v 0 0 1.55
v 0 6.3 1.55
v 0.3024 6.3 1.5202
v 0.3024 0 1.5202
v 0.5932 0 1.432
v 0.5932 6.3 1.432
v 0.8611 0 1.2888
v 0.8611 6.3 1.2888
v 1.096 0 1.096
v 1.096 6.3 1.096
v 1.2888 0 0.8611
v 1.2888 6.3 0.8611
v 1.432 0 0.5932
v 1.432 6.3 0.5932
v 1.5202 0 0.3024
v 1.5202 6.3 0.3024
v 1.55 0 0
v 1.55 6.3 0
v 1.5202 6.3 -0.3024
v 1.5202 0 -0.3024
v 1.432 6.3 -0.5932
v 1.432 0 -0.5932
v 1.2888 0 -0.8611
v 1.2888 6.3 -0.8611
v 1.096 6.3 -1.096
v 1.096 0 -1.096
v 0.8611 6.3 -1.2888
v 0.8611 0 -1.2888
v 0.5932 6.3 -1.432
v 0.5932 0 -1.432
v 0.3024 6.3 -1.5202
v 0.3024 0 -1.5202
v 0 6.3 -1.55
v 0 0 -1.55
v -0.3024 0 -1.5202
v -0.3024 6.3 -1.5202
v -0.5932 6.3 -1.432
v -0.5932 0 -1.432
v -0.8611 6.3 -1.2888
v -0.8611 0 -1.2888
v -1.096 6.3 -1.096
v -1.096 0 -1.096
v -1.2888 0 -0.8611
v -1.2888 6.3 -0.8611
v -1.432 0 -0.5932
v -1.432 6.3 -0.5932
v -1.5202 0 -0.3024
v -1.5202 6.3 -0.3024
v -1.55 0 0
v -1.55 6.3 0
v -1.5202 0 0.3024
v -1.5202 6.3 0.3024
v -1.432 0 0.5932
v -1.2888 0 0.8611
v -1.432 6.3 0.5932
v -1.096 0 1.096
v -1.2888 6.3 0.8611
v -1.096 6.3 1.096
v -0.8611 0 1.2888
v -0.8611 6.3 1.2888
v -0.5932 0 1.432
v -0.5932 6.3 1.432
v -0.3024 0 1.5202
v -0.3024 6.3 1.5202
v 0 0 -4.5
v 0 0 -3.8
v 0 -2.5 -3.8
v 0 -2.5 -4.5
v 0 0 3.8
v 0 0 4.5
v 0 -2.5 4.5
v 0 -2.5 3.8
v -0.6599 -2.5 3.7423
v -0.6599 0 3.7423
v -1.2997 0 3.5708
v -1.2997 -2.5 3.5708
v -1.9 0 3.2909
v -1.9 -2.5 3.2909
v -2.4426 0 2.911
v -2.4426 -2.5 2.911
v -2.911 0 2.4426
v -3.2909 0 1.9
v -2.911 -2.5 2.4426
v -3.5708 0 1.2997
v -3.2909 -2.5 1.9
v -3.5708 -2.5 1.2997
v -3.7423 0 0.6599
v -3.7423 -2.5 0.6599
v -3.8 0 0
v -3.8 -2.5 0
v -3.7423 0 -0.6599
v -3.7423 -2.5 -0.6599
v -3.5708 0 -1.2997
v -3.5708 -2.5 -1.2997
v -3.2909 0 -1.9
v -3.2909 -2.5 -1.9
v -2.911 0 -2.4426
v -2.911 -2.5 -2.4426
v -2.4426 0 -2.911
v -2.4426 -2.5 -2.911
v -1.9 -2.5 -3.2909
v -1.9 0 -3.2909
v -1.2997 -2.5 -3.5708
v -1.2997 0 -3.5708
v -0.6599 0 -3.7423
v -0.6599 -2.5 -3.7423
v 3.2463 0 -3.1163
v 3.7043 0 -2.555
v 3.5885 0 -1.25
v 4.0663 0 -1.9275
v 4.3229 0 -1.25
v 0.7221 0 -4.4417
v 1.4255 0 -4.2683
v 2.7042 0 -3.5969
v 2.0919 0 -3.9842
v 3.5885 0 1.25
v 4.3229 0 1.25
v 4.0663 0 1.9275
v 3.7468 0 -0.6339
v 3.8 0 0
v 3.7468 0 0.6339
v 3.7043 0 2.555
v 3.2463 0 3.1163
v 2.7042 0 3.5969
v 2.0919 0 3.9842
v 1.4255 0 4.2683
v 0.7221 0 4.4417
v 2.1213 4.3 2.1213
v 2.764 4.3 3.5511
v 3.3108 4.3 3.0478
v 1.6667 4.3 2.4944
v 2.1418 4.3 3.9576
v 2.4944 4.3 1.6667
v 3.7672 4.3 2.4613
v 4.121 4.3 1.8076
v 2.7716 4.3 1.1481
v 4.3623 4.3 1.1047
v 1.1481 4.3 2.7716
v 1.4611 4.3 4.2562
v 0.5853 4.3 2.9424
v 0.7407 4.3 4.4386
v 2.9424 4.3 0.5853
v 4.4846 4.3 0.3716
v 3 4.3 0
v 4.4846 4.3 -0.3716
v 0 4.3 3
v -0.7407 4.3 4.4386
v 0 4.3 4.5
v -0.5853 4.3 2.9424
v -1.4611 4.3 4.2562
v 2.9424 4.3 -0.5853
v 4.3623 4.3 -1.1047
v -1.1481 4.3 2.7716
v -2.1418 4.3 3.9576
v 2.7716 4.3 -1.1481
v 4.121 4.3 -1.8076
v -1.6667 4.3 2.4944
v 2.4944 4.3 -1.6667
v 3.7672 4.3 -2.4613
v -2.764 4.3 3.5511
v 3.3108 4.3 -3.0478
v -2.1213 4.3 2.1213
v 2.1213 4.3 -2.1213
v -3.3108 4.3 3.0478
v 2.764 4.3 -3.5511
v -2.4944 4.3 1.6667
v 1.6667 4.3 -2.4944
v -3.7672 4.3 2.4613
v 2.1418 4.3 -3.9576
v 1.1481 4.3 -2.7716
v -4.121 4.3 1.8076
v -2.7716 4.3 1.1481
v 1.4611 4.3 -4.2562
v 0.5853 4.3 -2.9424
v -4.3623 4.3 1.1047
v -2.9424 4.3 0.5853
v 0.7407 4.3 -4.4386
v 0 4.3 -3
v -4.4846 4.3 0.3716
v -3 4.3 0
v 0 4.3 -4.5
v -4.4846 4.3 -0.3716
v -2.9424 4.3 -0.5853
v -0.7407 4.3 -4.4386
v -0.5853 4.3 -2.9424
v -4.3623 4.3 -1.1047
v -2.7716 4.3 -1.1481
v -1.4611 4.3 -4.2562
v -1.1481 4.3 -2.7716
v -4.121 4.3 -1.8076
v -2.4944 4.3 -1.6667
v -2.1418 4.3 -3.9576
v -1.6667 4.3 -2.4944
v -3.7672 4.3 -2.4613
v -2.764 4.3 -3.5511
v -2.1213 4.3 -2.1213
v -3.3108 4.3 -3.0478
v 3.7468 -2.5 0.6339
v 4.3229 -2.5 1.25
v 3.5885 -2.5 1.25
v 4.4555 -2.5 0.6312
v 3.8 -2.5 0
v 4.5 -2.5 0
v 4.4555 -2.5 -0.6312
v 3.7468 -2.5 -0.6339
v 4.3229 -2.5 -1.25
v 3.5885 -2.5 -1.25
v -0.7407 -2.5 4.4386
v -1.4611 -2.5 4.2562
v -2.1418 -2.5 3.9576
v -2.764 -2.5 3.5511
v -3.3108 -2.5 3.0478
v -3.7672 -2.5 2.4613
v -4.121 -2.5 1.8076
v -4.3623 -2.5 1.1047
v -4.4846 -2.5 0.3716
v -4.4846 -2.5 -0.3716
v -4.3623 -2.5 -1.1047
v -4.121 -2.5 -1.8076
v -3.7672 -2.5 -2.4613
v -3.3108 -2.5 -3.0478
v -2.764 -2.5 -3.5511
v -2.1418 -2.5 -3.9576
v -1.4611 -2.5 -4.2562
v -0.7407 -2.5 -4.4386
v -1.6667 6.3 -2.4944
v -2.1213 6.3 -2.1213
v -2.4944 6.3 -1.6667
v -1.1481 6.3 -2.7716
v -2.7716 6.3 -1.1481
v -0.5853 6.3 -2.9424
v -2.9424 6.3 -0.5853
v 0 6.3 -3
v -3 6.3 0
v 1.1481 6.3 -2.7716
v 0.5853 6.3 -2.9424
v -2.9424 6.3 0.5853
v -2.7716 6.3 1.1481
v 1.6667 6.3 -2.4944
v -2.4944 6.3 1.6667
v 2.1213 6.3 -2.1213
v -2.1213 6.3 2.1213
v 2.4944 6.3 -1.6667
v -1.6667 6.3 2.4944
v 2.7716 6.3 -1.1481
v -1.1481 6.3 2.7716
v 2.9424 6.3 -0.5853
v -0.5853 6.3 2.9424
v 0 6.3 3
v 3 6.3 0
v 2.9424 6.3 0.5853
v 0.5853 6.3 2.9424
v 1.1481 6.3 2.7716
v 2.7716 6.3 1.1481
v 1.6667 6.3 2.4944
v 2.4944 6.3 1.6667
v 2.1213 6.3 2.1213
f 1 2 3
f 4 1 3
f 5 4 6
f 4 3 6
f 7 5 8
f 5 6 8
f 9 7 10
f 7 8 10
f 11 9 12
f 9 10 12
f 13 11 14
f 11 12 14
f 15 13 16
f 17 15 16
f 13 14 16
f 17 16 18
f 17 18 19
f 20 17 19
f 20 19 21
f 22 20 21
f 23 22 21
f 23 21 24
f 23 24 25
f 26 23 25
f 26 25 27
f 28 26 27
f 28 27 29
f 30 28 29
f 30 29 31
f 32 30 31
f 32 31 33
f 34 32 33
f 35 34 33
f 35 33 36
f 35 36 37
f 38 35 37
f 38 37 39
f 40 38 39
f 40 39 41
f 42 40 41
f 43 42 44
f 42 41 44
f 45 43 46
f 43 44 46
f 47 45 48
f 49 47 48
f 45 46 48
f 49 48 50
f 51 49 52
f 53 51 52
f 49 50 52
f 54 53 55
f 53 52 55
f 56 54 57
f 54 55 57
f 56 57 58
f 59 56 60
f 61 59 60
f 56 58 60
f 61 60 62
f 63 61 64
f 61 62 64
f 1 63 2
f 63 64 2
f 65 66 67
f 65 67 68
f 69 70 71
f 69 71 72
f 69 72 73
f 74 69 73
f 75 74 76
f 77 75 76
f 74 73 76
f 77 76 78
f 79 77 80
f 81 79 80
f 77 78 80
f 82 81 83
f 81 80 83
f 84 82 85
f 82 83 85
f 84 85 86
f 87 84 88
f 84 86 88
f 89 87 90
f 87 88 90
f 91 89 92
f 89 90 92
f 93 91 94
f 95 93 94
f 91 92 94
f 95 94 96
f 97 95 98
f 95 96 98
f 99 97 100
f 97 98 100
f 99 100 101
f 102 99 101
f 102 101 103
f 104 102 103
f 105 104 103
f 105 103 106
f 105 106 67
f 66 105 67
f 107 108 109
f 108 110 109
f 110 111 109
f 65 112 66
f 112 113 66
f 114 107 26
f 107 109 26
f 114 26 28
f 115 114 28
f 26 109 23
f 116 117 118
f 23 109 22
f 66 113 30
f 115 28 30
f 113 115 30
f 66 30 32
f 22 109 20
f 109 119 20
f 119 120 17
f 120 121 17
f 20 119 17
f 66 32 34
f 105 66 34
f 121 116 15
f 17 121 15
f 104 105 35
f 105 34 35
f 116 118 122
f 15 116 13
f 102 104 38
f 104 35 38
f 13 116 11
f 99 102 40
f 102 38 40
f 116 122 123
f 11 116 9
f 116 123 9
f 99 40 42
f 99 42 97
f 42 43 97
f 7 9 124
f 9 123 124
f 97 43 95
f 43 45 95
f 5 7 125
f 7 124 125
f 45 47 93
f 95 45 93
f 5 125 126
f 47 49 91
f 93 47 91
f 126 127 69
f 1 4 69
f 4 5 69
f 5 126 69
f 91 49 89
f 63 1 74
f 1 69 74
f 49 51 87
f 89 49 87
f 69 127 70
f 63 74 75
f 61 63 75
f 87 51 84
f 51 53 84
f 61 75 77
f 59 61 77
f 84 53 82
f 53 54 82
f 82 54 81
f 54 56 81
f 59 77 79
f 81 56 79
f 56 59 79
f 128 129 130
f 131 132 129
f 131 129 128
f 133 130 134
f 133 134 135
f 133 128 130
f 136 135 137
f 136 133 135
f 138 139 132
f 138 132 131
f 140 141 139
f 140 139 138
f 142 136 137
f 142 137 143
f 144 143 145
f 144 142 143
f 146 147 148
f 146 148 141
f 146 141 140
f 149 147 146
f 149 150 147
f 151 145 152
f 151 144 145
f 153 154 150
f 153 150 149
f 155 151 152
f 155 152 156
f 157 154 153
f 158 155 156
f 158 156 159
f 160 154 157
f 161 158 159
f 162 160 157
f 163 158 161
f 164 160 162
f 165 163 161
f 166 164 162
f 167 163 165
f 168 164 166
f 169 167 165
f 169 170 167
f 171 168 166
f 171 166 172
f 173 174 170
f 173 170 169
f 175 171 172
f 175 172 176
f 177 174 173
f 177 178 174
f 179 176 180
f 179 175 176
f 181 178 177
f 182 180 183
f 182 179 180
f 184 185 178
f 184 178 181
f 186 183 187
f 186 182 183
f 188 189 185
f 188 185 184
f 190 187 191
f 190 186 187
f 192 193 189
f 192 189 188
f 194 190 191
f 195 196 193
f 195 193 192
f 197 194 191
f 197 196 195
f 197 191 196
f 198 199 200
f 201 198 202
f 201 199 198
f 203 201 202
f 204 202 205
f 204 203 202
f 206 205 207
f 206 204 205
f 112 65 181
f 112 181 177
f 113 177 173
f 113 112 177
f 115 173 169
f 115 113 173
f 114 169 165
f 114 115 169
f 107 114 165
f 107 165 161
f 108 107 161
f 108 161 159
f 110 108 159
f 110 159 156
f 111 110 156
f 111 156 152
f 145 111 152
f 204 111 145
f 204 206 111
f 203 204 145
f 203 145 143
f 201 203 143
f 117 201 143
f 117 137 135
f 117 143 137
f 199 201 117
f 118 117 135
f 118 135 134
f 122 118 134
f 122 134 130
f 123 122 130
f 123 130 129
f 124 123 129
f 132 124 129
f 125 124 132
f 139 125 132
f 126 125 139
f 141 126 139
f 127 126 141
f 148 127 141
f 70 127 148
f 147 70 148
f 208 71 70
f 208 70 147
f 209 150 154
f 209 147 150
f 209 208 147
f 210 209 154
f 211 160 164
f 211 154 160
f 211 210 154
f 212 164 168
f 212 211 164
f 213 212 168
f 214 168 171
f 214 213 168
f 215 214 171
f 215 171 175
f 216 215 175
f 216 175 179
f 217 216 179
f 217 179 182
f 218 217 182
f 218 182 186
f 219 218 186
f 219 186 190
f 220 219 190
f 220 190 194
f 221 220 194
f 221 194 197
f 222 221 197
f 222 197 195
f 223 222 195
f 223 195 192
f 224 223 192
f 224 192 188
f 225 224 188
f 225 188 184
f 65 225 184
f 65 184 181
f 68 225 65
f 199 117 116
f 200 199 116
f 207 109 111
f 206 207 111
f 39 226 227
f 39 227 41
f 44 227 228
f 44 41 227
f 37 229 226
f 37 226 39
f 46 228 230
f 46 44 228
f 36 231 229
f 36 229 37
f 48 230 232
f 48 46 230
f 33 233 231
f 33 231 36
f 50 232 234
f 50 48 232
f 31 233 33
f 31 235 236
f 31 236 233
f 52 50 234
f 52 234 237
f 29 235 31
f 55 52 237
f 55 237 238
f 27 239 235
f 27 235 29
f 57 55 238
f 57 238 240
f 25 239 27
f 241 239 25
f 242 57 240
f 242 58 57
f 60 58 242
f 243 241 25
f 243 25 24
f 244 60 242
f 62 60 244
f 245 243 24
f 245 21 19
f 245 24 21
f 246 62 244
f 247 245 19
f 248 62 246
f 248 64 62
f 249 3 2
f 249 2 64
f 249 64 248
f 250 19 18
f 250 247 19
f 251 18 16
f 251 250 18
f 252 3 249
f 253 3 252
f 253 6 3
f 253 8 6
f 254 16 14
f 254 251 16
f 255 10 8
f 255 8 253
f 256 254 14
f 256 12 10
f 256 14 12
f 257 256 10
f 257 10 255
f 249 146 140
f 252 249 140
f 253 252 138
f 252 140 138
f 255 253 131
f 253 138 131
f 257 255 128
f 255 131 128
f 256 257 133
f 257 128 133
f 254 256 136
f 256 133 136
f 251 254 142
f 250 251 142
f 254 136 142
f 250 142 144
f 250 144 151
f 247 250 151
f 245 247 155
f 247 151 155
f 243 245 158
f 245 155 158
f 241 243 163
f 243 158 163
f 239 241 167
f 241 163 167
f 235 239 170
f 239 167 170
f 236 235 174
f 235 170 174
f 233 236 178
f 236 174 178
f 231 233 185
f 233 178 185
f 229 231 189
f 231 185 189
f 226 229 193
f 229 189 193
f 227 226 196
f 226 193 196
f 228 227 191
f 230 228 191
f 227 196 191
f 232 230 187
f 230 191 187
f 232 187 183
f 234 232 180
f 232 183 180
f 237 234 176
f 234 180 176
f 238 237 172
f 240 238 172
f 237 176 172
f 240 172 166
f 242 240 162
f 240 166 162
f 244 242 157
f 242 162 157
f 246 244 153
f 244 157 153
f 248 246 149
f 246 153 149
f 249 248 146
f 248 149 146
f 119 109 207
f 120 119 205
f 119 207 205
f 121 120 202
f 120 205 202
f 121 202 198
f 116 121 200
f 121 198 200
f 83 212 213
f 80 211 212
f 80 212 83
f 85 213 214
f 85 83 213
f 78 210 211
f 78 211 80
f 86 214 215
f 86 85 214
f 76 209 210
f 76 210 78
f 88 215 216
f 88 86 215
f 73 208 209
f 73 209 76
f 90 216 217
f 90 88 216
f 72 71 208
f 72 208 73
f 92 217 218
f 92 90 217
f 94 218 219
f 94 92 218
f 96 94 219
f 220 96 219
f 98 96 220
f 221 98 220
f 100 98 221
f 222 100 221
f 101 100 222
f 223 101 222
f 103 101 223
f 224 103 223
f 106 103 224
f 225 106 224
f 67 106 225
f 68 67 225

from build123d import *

# Parameters (mm, degrees)
SKETCH1_R           = 4.5
BOSS_EXTRUDE1_DEPTH = 4.3
SKETCH2_R           = 3
BOSS_EXTRUDE2_DEPTH = 2
SKETCH3_R           = 1.55
CUT_EXTRUDE1_DEPTH  = 9.954886934
BOSS_EXTRUDE3_START = 2.5
SKETCH4_R           = 4.5
SKETCH4_R_2         = 3.8
BOSS_EXTRUDE3_DEPTH = 2.5
CUT_EXTRUDE2_DEPTH  = 9.954886934


with BuildPart() as part:
    # Sketch1 → Boss-Extrude1 (new body)
    with BuildSketch(Plane(origin=(0, 0, 0), x_dir=(1, 0, 0), z_dir=(0, 1, 0))):
        with Locations(Location((0, 0, 0), (0, 0, 90))):
            Circle(SKETCH1_R)
    extrude(amount=BOSS_EXTRUDE1_DEPTH)

    # Sketch2 → Boss-Extrude2 (add)
    with BuildSketch(Plane(origin=(0, 4.3, 0), x_dir=(1, 0, 0), z_dir=(0, 1, 0))):
        with Locations(Location((0, 0, 0), (0, 0, 270))):
            Circle(SKETCH2_R)
    extrude(amount=BOSS_EXTRUDE2_DEPTH)

    # Sketch3 → Cut-Extrude1 (cut, through all)
    with BuildSketch(Plane(origin=(0, 6.3, 0), x_dir=(1, 0, 0), z_dir=(0, 1, 0))):
        with Locations(Location((0, 0, 0), (0, 0, 270))):
            Circle(SKETCH3_R)
    extrude(amount=-CUT_EXTRUDE1_DEPTH, mode=Mode.SUBTRACT)

    # Sketch4 → Boss-Extrude3 (add)
    with BuildSketch(Plane.XZ.offset(BOSS_EXTRUDE3_START)):
        with Locations(Location((0, 0, 0), (0, 0, 270))):
            Circle(SKETCH4_R)
        with Locations(Location((0, 0, 0), (0, 0, 270))):
            Circle(SKETCH4_R_2, mode=Mode.SUBTRACT)
    extrude(amount=-BOSS_EXTRUDE3_DEPTH)

    # Sketch5 → Cut-Extrude2 (cut, through all)
    with BuildSketch(Plane.XZ):
        Polygon((0, 0), (0, 5.809318517), (6.55644872, 5.809318517), (6.55644872, 1.25), (2.958025702, 1.25), (2.958025702, -1.25), (6.55644872, -1.25), (6.55644872, -5.809318517), (0, -5.809318517), align=None)
    extrude(amount=CUT_EXTRUDE2_DEPTH, mode=Mode.SUBTRACT)


solid = part.part
